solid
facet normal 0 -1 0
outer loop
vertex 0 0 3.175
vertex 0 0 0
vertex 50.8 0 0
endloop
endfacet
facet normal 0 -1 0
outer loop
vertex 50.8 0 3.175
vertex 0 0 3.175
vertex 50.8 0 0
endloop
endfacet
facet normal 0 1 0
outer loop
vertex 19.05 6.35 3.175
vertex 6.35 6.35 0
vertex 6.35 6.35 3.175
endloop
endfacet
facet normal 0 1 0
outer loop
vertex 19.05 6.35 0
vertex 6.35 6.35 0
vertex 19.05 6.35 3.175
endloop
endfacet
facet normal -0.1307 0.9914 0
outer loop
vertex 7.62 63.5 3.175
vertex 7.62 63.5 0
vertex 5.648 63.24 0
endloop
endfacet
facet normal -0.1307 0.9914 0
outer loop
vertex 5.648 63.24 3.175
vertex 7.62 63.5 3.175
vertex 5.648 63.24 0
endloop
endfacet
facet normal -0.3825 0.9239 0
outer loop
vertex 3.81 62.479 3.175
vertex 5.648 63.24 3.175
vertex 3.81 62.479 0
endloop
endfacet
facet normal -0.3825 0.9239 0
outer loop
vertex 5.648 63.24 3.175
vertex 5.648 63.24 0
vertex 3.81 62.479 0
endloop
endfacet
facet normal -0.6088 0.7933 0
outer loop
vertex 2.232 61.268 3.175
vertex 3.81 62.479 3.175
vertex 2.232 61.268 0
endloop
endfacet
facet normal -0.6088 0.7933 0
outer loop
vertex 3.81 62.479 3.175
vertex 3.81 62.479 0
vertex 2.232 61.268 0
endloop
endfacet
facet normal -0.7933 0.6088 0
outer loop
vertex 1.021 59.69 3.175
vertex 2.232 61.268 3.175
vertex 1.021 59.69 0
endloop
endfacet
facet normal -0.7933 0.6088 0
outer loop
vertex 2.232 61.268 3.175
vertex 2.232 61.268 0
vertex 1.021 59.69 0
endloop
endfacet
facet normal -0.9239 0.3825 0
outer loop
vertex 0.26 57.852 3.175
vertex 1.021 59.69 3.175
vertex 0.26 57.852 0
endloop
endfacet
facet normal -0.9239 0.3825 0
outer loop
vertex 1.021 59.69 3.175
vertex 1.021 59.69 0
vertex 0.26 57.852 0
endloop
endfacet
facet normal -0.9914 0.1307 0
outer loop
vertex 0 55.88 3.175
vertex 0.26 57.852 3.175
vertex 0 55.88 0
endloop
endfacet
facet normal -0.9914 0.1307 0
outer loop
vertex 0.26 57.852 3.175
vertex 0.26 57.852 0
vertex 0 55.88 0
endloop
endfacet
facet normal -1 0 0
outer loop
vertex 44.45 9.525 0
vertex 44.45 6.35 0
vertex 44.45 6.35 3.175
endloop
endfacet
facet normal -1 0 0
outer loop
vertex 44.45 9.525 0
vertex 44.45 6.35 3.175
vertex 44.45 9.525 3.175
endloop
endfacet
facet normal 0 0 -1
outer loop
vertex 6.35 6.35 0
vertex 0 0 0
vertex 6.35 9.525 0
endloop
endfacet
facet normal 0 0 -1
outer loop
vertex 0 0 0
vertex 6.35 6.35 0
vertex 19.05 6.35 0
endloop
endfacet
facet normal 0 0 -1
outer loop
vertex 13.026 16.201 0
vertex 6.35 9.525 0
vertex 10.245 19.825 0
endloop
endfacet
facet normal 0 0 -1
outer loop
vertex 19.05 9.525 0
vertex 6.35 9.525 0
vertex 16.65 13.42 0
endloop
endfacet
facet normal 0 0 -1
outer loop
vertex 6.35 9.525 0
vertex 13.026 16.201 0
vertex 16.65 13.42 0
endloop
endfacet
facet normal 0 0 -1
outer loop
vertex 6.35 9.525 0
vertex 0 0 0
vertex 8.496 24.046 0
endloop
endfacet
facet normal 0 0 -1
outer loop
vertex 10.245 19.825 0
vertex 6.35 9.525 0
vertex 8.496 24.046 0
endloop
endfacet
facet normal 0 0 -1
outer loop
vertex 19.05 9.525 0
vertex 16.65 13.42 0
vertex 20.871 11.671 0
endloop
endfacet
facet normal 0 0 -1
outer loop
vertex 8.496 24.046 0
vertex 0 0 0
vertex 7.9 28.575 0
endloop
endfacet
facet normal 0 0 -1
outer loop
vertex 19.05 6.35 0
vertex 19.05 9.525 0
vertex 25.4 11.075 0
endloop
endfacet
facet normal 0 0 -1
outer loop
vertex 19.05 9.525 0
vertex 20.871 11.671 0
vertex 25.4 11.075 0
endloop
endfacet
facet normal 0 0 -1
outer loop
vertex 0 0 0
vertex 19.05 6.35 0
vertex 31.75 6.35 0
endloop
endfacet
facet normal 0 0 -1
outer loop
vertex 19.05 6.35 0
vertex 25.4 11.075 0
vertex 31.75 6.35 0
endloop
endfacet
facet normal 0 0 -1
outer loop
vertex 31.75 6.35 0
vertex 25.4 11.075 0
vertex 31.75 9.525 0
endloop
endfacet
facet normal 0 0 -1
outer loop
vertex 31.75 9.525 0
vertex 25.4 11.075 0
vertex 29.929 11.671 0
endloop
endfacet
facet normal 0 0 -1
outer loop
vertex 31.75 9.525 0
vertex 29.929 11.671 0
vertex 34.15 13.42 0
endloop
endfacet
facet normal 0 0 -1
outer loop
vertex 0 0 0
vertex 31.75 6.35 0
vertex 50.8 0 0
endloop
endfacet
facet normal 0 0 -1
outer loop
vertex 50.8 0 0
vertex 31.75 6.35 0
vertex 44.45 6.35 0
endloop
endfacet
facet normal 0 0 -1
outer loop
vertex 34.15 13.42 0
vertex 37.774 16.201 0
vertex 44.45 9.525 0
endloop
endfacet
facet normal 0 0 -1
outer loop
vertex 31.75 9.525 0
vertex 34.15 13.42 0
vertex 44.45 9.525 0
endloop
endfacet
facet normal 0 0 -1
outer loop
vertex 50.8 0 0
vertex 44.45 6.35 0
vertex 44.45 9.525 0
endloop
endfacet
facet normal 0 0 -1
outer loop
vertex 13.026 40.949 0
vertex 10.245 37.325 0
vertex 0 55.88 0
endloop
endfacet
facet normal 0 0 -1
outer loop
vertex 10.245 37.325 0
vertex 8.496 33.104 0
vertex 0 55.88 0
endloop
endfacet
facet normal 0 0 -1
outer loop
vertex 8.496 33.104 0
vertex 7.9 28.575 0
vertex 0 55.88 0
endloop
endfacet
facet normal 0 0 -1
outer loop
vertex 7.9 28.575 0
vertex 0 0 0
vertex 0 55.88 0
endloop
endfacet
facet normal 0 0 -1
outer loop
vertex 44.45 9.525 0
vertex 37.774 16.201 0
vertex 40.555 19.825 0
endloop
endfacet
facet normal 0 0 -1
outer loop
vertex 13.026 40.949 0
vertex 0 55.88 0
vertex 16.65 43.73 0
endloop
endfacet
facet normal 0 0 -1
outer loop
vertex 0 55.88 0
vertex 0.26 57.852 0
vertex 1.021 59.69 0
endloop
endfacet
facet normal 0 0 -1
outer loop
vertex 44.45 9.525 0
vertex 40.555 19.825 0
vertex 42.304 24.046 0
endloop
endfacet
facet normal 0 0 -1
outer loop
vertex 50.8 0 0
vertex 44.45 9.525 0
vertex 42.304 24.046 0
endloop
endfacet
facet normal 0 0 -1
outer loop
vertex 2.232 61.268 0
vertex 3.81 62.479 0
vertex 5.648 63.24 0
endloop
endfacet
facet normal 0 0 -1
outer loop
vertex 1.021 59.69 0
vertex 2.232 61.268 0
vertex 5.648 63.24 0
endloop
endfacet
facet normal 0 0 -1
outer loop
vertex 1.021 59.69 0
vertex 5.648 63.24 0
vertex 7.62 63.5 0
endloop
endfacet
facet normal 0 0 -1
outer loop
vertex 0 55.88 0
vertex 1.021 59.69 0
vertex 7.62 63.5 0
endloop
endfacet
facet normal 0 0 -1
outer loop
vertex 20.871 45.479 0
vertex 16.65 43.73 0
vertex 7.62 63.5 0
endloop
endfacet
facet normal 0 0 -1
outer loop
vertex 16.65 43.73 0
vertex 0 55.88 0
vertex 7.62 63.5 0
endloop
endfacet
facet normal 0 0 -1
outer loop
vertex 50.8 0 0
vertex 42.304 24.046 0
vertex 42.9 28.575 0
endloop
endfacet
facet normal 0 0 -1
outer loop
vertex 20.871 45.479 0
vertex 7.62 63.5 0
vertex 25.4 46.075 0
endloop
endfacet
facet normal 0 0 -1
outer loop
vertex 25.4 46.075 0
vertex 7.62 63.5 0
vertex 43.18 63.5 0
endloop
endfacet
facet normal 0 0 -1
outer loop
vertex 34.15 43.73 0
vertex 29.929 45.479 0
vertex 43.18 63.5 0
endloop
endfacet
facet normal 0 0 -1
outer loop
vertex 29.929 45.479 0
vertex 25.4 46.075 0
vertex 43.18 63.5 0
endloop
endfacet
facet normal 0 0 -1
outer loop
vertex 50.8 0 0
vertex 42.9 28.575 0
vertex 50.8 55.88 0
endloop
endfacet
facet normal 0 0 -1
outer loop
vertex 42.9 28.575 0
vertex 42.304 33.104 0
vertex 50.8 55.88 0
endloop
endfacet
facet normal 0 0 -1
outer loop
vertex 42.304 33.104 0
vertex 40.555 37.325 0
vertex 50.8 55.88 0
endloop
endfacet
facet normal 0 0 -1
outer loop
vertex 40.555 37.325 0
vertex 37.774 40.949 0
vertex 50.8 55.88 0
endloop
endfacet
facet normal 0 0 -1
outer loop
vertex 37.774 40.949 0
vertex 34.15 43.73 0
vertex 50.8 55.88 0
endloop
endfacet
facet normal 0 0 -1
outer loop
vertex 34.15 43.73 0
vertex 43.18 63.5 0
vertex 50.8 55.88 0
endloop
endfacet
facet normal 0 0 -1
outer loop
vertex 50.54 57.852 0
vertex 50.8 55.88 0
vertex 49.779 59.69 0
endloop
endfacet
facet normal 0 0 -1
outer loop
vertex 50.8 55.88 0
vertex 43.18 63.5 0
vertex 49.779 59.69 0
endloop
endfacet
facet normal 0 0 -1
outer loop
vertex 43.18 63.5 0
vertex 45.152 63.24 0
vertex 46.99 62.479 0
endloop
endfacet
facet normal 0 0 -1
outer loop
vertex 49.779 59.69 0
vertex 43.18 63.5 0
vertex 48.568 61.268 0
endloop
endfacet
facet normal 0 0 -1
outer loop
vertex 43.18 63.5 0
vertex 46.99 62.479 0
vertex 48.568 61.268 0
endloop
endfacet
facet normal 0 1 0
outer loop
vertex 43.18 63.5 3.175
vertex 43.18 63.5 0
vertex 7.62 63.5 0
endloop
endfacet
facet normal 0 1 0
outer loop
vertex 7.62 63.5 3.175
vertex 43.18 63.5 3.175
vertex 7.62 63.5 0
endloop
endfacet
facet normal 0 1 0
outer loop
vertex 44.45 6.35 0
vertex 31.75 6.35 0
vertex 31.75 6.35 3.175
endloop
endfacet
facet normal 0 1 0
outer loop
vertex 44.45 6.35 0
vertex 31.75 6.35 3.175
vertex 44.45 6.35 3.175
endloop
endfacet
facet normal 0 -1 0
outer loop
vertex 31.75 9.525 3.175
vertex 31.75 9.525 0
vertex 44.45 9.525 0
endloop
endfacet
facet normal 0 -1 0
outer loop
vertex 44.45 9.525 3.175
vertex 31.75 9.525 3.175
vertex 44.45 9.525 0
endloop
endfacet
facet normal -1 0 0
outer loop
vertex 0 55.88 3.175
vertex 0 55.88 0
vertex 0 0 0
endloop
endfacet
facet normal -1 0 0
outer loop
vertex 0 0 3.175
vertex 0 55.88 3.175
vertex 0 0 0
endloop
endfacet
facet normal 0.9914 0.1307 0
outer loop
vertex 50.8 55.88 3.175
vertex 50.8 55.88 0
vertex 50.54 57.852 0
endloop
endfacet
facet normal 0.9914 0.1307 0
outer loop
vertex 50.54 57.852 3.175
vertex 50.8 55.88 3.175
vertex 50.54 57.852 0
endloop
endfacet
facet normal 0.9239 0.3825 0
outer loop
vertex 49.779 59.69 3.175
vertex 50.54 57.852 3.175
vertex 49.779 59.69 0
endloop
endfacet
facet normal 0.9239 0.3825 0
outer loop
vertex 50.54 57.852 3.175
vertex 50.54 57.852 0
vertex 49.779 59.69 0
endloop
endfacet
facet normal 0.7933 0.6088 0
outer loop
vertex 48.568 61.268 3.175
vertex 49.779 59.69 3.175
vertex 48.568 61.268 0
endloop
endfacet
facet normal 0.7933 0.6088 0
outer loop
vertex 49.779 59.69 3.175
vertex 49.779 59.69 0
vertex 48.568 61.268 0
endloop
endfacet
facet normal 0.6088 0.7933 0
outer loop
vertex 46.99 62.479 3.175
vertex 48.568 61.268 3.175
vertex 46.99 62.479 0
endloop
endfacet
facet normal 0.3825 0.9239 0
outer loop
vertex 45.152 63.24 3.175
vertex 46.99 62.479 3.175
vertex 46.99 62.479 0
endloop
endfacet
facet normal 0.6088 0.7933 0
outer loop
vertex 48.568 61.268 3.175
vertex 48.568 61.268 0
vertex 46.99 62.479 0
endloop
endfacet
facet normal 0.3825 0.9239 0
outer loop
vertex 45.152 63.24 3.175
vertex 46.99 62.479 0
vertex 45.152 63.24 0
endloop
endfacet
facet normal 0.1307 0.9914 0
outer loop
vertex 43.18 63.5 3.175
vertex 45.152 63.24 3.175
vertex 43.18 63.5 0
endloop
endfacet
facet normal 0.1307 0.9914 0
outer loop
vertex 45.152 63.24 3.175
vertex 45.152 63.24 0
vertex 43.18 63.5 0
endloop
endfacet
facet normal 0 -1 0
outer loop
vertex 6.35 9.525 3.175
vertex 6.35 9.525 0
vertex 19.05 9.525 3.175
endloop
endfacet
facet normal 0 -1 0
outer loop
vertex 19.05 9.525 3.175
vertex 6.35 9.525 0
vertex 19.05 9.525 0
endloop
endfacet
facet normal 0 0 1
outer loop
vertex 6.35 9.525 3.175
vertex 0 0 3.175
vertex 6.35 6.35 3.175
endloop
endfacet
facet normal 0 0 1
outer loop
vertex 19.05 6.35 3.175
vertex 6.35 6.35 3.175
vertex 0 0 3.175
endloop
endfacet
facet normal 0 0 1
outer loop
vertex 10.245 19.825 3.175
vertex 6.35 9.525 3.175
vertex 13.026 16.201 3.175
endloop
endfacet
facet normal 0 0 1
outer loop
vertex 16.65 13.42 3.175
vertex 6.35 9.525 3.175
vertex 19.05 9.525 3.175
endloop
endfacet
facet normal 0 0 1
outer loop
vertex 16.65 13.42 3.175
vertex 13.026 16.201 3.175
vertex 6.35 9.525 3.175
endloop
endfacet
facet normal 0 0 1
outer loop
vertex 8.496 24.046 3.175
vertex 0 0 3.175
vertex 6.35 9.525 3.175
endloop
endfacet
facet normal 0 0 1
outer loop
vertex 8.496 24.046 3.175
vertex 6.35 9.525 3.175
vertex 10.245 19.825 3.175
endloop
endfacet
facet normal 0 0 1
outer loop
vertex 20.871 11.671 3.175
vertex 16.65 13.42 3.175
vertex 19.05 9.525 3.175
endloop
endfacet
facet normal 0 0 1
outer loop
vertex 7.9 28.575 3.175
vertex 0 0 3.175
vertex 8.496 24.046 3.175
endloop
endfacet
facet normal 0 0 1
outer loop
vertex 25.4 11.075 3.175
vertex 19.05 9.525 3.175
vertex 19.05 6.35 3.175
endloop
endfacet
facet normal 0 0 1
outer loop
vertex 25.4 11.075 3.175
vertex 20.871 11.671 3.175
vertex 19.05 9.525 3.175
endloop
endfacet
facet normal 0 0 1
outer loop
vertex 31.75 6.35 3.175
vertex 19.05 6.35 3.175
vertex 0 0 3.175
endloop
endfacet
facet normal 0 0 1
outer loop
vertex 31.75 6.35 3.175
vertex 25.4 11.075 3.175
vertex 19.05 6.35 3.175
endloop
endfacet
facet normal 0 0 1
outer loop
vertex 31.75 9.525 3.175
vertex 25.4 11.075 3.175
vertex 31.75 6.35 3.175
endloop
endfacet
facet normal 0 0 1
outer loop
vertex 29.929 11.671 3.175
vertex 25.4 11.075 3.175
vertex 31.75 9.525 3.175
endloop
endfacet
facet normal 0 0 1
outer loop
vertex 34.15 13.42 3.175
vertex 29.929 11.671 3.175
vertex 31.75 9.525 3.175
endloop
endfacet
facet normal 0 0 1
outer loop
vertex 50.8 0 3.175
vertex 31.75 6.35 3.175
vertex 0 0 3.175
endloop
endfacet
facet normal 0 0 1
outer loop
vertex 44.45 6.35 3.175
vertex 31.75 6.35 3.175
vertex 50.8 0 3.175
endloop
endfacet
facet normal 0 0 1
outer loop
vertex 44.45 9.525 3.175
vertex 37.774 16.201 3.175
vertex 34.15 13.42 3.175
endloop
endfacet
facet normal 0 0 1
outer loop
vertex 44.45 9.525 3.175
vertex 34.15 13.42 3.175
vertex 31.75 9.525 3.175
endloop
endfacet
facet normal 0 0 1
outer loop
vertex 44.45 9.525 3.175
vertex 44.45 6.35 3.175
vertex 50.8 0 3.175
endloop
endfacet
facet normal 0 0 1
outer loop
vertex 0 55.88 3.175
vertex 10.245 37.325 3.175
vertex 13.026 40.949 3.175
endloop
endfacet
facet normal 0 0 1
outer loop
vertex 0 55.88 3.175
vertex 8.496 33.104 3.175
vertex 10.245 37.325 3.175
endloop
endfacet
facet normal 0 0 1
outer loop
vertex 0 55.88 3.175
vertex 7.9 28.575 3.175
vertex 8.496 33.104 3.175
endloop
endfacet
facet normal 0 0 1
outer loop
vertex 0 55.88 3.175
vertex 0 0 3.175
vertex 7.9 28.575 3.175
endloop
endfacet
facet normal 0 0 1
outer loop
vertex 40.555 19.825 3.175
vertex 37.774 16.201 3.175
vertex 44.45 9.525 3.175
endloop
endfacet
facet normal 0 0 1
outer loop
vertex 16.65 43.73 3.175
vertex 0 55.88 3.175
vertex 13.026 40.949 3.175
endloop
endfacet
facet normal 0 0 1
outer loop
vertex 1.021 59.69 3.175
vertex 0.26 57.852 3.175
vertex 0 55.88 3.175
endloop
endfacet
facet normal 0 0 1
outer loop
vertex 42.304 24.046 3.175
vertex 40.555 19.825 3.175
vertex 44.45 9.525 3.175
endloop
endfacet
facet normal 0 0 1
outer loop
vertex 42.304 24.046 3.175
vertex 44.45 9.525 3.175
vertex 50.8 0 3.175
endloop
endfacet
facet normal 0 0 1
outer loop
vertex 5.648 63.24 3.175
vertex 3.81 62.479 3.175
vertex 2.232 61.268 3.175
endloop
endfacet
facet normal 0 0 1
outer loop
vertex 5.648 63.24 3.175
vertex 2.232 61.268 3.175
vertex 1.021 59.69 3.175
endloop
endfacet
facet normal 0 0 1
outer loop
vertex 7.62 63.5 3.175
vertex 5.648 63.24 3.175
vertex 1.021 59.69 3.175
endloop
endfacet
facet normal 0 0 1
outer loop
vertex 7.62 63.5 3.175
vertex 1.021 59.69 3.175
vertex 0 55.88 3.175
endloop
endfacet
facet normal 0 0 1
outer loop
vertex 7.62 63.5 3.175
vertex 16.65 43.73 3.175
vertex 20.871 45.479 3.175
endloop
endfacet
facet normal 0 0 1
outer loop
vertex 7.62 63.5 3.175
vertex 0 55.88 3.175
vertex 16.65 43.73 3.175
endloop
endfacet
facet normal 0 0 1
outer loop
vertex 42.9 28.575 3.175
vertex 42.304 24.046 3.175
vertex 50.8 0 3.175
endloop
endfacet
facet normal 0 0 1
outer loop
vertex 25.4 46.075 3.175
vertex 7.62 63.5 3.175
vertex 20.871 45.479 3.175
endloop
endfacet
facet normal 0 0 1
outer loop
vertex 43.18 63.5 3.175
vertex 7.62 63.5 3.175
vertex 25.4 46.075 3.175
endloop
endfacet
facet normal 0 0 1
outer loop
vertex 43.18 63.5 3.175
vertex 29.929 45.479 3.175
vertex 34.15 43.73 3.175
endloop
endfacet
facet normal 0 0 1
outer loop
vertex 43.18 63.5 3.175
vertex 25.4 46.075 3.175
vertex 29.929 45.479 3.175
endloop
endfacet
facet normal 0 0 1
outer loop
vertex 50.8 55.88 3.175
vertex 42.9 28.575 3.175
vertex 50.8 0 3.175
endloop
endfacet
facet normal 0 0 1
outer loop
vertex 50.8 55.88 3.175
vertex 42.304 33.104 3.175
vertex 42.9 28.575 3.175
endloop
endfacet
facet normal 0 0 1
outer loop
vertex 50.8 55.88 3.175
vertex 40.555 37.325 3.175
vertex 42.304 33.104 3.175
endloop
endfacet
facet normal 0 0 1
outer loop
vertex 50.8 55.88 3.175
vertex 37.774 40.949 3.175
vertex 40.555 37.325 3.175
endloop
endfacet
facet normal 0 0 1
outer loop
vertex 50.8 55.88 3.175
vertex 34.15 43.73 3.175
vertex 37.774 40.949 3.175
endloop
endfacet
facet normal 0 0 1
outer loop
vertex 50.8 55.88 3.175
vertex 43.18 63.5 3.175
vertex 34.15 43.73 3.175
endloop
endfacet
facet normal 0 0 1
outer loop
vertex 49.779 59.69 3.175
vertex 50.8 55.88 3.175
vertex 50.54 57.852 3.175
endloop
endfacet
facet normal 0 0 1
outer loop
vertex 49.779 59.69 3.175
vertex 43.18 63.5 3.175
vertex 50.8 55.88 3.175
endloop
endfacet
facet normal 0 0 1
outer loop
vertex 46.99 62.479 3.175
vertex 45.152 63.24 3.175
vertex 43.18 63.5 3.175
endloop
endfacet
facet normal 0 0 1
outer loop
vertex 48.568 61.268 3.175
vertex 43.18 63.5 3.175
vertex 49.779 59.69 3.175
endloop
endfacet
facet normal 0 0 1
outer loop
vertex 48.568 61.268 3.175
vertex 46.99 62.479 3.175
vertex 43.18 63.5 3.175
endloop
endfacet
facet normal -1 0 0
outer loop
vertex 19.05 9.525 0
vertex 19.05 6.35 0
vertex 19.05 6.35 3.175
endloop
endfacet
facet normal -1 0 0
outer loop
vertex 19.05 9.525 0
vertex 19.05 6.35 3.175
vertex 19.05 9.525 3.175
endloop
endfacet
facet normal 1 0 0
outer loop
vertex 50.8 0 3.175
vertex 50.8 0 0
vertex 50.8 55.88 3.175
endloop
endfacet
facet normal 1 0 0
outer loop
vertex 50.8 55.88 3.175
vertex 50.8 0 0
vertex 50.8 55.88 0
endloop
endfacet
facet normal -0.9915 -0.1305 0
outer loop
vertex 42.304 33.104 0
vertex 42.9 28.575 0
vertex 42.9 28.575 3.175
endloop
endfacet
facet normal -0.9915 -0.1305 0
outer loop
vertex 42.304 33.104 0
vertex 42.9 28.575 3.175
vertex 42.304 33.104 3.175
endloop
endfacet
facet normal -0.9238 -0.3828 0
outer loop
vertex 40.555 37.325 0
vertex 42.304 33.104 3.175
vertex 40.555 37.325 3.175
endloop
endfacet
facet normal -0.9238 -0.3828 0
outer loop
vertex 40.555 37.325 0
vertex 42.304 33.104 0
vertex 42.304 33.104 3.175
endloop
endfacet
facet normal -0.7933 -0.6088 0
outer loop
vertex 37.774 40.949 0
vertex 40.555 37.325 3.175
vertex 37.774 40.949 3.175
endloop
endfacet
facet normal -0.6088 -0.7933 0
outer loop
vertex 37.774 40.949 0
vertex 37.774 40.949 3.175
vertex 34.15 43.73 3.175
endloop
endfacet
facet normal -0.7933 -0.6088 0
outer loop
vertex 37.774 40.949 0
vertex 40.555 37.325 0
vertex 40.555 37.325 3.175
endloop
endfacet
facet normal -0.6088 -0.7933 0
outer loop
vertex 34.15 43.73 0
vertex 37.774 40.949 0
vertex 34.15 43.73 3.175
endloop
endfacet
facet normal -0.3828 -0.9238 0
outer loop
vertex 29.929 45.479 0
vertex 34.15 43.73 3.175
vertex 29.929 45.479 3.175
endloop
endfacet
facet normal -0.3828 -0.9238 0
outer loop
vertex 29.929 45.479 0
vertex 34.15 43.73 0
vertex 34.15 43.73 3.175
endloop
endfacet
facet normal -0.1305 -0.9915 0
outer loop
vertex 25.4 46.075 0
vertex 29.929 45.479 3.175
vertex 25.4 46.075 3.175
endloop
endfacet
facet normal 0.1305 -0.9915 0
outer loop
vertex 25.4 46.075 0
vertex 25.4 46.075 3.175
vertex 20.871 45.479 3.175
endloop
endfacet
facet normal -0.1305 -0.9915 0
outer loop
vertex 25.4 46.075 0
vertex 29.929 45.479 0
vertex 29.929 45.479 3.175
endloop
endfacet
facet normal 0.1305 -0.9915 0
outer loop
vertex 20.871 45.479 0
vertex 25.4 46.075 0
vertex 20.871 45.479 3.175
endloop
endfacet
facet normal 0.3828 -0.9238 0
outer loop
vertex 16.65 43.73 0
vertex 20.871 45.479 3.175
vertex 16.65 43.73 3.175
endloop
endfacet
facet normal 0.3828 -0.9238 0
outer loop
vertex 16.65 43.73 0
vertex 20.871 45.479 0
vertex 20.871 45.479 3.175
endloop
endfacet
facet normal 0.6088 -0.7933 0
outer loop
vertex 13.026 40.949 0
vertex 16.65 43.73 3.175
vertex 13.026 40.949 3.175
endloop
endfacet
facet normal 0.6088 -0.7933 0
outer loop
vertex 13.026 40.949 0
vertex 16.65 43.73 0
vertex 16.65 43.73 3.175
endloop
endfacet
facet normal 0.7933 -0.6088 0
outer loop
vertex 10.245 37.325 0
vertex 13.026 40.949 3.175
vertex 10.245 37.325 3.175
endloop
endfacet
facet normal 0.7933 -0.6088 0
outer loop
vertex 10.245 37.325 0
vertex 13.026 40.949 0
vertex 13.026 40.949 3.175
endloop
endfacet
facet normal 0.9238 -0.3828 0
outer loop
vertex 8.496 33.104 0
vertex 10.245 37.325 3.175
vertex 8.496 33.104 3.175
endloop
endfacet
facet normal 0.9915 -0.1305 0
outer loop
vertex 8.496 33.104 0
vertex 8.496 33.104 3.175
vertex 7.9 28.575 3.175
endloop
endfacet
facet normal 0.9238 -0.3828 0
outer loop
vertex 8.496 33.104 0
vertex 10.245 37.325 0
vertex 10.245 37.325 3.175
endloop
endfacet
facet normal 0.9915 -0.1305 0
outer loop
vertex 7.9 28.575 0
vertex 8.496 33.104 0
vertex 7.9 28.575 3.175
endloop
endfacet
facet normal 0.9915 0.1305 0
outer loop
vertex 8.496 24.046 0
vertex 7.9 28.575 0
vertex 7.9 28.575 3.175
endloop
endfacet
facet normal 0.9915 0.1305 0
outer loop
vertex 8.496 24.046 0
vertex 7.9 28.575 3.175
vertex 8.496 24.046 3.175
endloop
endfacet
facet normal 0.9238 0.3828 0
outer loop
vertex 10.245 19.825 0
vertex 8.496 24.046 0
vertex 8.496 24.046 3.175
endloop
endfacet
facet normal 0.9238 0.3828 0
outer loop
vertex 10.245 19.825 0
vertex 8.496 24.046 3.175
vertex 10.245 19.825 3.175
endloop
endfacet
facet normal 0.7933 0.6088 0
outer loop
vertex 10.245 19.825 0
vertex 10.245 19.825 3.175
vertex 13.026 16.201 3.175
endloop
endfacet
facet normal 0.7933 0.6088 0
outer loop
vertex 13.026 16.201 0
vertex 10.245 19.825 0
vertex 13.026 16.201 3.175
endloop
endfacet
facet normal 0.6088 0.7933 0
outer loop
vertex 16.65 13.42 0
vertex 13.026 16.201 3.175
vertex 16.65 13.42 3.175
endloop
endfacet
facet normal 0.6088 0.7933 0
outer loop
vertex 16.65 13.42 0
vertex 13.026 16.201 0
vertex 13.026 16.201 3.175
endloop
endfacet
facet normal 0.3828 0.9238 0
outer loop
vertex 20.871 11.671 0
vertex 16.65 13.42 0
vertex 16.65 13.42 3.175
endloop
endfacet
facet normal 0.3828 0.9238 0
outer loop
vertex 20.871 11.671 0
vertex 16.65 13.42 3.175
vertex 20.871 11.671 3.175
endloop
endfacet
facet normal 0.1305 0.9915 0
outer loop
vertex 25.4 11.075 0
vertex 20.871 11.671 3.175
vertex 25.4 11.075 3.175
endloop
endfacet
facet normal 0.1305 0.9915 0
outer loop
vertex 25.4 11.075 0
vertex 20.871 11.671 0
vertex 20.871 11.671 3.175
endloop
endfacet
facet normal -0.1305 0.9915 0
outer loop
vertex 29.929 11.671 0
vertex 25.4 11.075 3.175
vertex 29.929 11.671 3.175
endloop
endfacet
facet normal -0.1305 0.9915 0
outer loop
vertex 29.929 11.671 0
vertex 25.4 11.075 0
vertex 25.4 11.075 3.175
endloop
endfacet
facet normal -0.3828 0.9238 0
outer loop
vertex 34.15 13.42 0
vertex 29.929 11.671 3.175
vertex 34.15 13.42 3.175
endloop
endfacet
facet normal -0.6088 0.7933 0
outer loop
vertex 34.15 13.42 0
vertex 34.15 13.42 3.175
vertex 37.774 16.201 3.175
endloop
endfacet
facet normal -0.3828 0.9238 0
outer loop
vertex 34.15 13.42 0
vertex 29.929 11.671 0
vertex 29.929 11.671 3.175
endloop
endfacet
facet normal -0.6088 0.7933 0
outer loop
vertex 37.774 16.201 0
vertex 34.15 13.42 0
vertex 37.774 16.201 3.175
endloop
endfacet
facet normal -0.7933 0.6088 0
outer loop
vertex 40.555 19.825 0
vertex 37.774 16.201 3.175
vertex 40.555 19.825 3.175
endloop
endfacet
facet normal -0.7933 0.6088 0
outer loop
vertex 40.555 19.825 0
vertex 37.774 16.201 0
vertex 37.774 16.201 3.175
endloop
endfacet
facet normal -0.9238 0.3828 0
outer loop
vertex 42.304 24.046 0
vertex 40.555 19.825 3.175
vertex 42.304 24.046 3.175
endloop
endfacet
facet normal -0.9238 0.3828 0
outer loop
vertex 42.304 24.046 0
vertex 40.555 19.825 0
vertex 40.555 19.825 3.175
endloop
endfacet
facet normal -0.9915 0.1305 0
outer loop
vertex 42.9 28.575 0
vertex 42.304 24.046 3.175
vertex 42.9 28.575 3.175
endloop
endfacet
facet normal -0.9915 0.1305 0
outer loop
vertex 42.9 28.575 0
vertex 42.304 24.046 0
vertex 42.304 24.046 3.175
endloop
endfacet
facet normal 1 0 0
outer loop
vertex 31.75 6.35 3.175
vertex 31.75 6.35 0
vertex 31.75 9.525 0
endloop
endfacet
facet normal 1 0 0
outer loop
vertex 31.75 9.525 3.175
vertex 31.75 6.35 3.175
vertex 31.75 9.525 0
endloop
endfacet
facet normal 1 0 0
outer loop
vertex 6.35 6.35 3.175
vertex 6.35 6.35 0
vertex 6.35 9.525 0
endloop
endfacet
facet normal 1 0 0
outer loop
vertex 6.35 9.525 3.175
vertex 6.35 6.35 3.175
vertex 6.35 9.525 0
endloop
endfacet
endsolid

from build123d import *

# Parameters (mm, degrees)
SKETCH1_R           = 17.5
SKETCH1_W           = 12.7
SKETCH1_H           = 3.175
BOSS_EXTRUDE1_DEPTH = 3.175


with BuildPart() as part:
    # Sketch1 → Boss-Extrude1 (new body)
    with BuildSketch(Plane.XY):
        with BuildLine():
            Line((0, 0), (50.8, 0))
            Line((50.8, 0), (50.8, 55.88))
            ThreePointArc((50.8, 55.88), (48.568153673, 61.268153673), (43.18, 63.5))
            Line((43.18, 63.5), (7.62, 63.5))
            ThreePointArc((7.62, 63.5), (2.231846327, 61.268153673), (0, 55.88))
            Line((0, 55.88), (0, 0))
        make_face()
        with Locations((25.4, 28.575)):
            Circle(SKETCH1_R, mode=Mode.SUBTRACT)
        with Locations((12.7, 7.9375)):
            Rectangle(SKETCH1_W, SKETCH1_H, mode=Mode.SUBTRACT)
        with Locations((38.1, 7.9375)):
            Rectangle(SKETCH1_W, SKETCH1_H, mode=Mode.SUBTRACT)
    extrude(amount=BOSS_EXTRUDE1_DEPTH)


solid = part.part
